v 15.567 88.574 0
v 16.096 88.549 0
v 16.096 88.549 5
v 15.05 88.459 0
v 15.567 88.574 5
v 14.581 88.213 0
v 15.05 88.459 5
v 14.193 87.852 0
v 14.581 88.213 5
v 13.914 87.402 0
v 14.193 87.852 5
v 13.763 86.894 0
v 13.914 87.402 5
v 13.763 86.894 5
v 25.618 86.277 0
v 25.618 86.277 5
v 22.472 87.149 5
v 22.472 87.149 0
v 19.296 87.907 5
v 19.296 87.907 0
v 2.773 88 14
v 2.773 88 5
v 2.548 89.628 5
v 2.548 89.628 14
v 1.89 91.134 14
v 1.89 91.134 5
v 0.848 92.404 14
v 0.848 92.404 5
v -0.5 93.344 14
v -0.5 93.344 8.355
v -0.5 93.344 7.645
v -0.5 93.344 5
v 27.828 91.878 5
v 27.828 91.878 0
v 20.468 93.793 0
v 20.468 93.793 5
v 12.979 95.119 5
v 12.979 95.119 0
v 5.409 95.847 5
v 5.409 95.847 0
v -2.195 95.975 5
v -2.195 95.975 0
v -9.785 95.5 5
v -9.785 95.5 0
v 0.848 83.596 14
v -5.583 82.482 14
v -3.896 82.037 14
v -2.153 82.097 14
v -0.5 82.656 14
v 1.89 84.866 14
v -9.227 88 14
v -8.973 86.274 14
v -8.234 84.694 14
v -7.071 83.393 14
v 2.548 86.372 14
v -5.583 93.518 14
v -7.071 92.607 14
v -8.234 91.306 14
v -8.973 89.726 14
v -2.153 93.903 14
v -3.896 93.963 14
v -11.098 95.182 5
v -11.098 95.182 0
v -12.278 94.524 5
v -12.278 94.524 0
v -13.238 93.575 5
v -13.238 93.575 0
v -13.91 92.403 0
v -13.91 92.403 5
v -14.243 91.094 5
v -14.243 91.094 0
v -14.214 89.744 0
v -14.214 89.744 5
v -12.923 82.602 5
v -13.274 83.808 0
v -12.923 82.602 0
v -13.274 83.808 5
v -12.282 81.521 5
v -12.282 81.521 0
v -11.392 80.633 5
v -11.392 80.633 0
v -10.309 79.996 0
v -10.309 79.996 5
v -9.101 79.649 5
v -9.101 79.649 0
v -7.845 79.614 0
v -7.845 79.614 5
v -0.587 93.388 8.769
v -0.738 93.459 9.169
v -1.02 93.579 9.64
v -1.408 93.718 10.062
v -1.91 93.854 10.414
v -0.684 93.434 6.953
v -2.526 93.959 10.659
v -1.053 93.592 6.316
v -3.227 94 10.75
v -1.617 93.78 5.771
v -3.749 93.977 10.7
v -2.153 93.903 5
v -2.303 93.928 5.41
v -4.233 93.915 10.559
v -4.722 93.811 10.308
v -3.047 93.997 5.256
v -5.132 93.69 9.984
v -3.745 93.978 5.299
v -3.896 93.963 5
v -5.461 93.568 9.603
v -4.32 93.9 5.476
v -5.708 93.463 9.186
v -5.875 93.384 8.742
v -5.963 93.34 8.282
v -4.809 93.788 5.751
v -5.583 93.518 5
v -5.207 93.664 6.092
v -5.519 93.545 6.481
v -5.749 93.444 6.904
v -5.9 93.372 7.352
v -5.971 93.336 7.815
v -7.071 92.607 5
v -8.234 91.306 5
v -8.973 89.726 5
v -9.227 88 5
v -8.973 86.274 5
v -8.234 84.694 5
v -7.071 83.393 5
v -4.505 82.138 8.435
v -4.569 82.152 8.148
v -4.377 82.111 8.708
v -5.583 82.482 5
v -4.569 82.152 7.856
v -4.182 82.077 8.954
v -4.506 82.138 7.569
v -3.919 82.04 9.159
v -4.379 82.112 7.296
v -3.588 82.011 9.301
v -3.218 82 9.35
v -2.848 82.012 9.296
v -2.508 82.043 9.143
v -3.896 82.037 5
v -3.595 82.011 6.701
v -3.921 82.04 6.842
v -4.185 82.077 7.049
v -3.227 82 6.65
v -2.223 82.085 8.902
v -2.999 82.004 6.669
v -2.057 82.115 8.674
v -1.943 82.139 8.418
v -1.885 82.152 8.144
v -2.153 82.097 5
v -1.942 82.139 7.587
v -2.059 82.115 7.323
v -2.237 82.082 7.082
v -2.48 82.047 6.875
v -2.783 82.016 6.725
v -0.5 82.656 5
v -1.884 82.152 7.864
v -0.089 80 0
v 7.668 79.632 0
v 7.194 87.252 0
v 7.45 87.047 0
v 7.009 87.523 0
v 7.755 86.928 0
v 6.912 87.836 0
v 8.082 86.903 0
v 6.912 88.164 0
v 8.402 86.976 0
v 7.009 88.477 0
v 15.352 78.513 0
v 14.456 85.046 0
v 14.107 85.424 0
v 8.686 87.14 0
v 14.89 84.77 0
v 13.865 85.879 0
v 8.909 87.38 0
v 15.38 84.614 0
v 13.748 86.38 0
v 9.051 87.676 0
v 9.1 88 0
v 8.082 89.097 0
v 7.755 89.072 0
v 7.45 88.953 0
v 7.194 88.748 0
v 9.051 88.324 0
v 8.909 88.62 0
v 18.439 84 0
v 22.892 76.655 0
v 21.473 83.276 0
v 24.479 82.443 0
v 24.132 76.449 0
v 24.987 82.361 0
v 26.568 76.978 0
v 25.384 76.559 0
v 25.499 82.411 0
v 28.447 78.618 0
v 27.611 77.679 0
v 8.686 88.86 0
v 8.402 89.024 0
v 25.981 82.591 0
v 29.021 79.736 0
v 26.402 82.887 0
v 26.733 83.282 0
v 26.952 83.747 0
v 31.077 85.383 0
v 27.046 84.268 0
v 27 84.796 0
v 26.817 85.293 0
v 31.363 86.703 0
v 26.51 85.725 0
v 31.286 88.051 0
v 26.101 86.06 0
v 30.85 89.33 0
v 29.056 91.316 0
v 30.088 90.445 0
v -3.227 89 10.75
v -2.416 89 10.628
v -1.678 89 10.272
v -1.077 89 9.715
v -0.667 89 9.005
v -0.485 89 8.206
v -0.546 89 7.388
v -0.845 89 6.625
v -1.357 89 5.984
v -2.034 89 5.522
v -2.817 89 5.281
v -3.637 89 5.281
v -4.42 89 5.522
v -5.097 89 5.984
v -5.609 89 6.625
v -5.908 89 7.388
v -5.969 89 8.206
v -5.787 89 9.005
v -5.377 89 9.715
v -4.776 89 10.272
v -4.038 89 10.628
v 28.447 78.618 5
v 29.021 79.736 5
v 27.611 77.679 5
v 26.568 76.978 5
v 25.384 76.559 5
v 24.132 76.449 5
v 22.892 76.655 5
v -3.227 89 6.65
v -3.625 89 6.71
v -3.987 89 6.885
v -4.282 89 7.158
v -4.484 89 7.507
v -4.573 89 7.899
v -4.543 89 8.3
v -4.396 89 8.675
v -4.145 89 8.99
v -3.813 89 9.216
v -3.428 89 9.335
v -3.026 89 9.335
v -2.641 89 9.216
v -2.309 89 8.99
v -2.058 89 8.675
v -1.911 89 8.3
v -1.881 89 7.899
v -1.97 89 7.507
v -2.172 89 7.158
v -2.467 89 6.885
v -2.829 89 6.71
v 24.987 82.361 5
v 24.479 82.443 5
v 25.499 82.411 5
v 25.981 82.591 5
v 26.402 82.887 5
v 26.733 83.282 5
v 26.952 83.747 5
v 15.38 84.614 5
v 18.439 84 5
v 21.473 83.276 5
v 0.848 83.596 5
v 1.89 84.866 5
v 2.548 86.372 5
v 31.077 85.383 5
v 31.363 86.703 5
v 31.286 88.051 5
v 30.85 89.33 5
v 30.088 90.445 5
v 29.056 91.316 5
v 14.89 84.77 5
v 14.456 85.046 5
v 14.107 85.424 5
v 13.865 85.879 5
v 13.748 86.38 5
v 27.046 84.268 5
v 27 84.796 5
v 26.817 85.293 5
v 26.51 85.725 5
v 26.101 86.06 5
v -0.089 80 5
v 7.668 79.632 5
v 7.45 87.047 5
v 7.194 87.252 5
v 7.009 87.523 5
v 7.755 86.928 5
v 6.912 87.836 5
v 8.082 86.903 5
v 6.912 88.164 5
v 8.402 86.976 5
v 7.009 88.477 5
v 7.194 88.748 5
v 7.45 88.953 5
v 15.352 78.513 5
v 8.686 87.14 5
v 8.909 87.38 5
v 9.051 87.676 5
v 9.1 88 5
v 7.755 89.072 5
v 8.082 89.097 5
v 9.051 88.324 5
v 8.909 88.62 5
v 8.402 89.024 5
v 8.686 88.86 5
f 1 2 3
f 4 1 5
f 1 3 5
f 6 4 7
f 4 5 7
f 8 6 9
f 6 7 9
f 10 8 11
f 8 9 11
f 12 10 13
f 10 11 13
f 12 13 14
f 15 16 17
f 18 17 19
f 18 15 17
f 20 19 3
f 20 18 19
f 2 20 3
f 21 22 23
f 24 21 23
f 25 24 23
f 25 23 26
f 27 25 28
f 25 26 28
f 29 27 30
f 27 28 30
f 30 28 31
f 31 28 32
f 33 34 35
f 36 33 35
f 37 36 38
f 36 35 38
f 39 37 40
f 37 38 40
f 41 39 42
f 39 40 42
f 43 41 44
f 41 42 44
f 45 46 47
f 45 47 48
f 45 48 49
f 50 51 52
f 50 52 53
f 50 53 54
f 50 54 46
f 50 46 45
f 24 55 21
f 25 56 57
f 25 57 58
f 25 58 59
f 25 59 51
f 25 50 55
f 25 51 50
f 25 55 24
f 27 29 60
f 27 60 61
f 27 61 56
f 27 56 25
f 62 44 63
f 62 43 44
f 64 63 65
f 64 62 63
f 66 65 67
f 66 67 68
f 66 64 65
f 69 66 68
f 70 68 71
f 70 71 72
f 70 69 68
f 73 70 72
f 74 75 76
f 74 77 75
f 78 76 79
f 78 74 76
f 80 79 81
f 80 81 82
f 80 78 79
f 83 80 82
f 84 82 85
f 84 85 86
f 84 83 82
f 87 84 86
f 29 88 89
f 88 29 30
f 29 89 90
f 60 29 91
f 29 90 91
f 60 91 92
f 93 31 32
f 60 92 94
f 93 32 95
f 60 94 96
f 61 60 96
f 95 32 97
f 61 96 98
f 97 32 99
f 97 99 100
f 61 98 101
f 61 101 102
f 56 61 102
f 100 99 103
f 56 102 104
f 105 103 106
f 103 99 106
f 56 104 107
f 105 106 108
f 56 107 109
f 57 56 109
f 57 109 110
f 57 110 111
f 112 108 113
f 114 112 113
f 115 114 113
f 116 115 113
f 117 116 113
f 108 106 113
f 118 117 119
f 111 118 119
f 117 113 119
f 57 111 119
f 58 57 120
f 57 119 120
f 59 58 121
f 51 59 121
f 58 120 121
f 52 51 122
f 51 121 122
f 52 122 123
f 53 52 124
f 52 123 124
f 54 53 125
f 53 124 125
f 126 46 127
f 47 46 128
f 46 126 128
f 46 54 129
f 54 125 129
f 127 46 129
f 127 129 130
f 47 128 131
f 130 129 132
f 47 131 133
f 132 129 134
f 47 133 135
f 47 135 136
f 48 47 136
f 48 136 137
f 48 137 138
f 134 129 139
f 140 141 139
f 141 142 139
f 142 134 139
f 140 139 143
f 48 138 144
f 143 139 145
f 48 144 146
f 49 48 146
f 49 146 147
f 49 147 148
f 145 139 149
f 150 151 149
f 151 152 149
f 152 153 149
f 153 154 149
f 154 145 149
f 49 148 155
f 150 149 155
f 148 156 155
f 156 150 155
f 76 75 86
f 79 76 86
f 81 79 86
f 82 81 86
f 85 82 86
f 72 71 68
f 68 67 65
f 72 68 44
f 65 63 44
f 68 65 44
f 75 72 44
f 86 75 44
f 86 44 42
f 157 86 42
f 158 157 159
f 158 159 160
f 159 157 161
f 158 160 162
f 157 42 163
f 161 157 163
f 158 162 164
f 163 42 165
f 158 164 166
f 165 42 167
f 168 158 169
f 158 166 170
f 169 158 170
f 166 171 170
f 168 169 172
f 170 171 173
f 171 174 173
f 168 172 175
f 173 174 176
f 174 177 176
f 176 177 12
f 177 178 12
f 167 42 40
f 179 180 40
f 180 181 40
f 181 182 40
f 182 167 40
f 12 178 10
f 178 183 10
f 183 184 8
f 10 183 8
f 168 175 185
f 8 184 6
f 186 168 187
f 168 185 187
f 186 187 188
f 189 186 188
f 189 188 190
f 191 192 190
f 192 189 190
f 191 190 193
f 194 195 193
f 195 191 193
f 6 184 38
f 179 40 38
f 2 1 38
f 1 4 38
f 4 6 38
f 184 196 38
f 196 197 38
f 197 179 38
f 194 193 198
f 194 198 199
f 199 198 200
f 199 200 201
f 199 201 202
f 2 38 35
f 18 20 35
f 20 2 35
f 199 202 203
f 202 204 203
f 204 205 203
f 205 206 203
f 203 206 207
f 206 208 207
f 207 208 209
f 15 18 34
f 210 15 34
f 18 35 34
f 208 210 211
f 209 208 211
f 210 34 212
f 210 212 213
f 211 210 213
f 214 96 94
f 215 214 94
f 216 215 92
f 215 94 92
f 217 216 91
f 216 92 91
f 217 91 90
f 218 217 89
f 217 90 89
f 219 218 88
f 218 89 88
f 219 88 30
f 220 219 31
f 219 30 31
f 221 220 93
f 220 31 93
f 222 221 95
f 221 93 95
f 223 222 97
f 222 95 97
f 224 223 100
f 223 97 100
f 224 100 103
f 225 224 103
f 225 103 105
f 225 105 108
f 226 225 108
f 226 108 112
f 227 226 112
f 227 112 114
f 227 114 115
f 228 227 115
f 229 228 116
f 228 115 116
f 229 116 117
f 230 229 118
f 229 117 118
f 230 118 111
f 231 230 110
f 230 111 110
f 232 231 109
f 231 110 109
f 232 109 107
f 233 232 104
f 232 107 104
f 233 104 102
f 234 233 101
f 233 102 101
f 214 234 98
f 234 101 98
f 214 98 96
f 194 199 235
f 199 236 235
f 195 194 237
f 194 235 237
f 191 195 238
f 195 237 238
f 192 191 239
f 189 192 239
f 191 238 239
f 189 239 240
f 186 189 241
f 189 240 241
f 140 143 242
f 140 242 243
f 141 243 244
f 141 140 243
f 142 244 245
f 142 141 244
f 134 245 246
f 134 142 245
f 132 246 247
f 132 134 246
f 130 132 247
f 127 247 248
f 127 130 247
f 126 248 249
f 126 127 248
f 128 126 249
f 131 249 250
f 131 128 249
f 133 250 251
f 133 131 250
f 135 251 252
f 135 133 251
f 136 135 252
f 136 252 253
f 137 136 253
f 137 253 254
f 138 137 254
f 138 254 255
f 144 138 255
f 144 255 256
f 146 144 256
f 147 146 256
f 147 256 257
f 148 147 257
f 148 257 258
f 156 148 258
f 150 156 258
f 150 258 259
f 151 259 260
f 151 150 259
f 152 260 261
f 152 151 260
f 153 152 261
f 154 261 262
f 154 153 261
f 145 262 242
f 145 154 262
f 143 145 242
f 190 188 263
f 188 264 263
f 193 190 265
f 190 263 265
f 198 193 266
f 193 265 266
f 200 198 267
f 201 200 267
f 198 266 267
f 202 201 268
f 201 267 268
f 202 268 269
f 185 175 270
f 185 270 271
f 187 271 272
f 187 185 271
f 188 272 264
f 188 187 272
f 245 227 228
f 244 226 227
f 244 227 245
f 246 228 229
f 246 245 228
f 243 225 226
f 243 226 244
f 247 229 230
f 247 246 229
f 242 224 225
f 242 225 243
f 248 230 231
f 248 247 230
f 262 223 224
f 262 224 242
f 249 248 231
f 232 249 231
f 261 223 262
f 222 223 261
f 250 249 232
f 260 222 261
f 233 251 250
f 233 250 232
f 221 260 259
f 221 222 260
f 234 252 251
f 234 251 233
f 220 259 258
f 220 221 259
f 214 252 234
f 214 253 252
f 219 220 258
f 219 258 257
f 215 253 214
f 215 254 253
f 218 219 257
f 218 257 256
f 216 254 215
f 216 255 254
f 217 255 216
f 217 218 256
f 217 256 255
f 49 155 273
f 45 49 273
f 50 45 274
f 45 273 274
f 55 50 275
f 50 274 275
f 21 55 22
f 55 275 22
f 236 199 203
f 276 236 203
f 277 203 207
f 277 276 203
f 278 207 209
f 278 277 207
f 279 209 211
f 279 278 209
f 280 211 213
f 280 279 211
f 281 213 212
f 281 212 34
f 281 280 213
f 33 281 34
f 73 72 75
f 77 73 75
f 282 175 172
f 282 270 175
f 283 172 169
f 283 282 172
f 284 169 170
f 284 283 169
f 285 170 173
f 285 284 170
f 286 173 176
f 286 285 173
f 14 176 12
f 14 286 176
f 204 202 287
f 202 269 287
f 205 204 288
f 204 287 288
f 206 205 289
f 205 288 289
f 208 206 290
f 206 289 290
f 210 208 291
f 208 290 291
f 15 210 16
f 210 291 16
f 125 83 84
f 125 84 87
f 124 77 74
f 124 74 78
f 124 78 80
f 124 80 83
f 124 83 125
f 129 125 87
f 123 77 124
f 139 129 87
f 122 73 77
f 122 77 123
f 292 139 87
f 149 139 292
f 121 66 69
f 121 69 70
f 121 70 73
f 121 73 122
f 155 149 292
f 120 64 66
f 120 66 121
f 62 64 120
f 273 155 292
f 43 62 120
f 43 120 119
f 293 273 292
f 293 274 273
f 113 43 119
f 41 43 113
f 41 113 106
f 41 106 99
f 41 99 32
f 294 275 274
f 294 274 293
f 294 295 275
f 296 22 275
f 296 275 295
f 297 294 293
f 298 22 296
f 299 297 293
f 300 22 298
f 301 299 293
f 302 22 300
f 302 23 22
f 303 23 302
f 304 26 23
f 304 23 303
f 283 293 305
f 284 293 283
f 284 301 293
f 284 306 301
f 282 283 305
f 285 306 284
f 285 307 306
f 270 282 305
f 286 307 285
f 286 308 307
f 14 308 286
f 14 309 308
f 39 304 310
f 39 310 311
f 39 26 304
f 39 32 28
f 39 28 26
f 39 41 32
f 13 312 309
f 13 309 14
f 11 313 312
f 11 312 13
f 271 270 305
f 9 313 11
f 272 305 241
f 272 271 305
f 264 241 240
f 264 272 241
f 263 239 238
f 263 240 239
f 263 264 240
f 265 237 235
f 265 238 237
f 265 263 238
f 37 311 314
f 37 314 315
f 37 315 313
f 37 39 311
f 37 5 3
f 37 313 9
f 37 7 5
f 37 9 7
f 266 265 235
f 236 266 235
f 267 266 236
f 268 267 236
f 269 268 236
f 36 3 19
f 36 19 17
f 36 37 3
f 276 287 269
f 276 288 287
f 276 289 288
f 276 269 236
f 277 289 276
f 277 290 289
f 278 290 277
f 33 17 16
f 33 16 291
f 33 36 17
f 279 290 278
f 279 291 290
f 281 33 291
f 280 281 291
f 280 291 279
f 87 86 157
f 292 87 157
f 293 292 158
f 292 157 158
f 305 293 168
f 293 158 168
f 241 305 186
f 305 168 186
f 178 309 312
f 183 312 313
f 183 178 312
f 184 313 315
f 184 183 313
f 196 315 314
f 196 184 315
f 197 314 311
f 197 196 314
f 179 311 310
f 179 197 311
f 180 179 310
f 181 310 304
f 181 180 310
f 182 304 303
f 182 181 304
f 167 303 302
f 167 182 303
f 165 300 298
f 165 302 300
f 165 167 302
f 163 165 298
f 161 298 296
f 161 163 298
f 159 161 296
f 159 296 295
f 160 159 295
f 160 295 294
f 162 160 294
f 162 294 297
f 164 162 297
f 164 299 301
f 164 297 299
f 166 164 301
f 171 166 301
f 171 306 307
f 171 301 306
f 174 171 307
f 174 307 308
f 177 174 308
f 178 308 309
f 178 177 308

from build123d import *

# Parameters (mm, degrees)
BOSS_EXTRUDE1_DEPTH = 5
SKETCH1_13_R        = 1.1
CUT_EXTRUDE2_DEPTH  = 10
FILLET1_R           = 2
BOSS_EXTRUDE2_DEPTH = 14
SKETCH2_R           = 1.35
CUT_EXTRUDE3_DEPTH  = 110
FILLET2_R           = 5
CUT_EXTRUDE4_START  = 200
SKETCH2_3_R         = 2.75
CUT_EXTRUDE4_DEPTH  = 111


with BuildPart() as part:
    # Sketch1 → Boss-Extrude1 (new body)
    with BuildSketch(Plane.XY):
        with BuildLine():
            Line((27.361611466, 75.175409663), (32.833933759, 90.210491595))
            ThreePointArc((32.833933759, 90.210491595), (9.201192242, 95.558035043), (-15.017708644, 94.818080697))
            Line((-15.017708644, 94.818080697), (-12.514757203, 79.015067248))
            ThreePointArc((-12.514757203, 79.015067248), (7.667660202, 79.631695869), (27.361611466, 75.175409663))
        make_face()
    extrude(amount=BOSS_EXTRUDE1_DEPTH)

    # Sketch1<13> → Cut-Extrude2 (cut)
    with BuildSketch(Plane.XY):
        with BuildLine():
            ThreePointArc((13.453363993, 84.941197291), (19.959187303, 83.651843029), (26.346302102, 81.864964213))
            Line((26.346302102, 81.864964213), (27.571711502, 85.672636967))
            ThreePointArc((27.571711502, 85.672636967), (20.887521597, 87.542626426), (14.079101854, 88.891950654))
            Line((14.079101854, 88.891950654), (13.453363993, 84.941197291))
        make_face()
        with Locations((8, 88)):
            Circle(SKETCH1_13_R)
    extrude(amount=CUT_EXTRUDE2_DEPTH, mode=Mode.SUBTRACT)

    # Fillet1
    fillet1_edges = [part.edges().sort_by_distance(p)[0] for p in [
        (26.346302102, 81.864964213, 2.5),
        (27.571711502, 85.672636967, 2.5),
        (14.079101854, 88.891950654, 2.5),
        (13.453363993, 84.941197291, 2.5),
    ]]
    fillet(fillet1_edges, radius=FILLET1_R - 0.0001)  # a hair under: the kernel refuses the full size

    # Sketch1<14> → Boss-Extrude2 (add)
    with BuildSketch(Plane.XY):
        with BuildLine():
            ThreePointArc((-0.5, 93.344488005), (-9.226985142, 88), (-0.5, 82.655511995))
            Line((-0.5, 82.655511995), (-0.5, 93.344488005))
        make_face()
        with BuildLine():
            Line((-0.5, 93.344488005), (-0.5, 82.655511995))
            ThreePointArc((-0.5, 82.655511995), (1.889747744, 84.866464525), (2.773014858, 88))
            ThreePointArc((2.773014858, 88), (1.889747744, 91.133535475), (-0.5, 93.344488005))
        make_face()
    extrude(amount=BOSS_EXTRUDE2_DEPTH)

    # Sketch2 → Cut-Extrude3 (cut)
    with BuildSketch(Plane(origin=(0, 0, 0), x_dir=(1, 0, 0), z_dir=(0, 1, 0))):
        with Locations(Location((-3.226985142, -8, 0), (0, 0, 90))):
            Circle(SKETCH2_R)
    extrude(amount=CUT_EXTRUDE3_DEPTH, mode=Mode.SUBTRACT)

    # Fillet2
    fillet2_edges = [part.edges().sort_by_distance(p)[0] for p in [
        (27.361611466, 75.175409663, 2.5),
        (-12.514757203, 79.015067248, 2.5),
        (-15.017708644, 94.818080697, 2.5),
        (32.833933759, 90.210491595, 2.5),
    ]]
    fillet(fillet2_edges, radius=FILLET2_R)

    # Sketch2<3> → Cut-Extrude4 (cut)
    with BuildSketch(Plane(origin=(0, 0, 0), x_dir=(1, 0, 0), z_dir=(0, 1, 0)).offset(CUT_EXTRUDE4_START)):
        with Locations(Location((-3.226985142, -8, 0), (0, 0, 270))):
            Circle(SKETCH2_3_R)
    extrude(amount=-CUT_EXTRUDE4_DEPTH, mode=Mode.SUBTRACT)


solid = part.part
